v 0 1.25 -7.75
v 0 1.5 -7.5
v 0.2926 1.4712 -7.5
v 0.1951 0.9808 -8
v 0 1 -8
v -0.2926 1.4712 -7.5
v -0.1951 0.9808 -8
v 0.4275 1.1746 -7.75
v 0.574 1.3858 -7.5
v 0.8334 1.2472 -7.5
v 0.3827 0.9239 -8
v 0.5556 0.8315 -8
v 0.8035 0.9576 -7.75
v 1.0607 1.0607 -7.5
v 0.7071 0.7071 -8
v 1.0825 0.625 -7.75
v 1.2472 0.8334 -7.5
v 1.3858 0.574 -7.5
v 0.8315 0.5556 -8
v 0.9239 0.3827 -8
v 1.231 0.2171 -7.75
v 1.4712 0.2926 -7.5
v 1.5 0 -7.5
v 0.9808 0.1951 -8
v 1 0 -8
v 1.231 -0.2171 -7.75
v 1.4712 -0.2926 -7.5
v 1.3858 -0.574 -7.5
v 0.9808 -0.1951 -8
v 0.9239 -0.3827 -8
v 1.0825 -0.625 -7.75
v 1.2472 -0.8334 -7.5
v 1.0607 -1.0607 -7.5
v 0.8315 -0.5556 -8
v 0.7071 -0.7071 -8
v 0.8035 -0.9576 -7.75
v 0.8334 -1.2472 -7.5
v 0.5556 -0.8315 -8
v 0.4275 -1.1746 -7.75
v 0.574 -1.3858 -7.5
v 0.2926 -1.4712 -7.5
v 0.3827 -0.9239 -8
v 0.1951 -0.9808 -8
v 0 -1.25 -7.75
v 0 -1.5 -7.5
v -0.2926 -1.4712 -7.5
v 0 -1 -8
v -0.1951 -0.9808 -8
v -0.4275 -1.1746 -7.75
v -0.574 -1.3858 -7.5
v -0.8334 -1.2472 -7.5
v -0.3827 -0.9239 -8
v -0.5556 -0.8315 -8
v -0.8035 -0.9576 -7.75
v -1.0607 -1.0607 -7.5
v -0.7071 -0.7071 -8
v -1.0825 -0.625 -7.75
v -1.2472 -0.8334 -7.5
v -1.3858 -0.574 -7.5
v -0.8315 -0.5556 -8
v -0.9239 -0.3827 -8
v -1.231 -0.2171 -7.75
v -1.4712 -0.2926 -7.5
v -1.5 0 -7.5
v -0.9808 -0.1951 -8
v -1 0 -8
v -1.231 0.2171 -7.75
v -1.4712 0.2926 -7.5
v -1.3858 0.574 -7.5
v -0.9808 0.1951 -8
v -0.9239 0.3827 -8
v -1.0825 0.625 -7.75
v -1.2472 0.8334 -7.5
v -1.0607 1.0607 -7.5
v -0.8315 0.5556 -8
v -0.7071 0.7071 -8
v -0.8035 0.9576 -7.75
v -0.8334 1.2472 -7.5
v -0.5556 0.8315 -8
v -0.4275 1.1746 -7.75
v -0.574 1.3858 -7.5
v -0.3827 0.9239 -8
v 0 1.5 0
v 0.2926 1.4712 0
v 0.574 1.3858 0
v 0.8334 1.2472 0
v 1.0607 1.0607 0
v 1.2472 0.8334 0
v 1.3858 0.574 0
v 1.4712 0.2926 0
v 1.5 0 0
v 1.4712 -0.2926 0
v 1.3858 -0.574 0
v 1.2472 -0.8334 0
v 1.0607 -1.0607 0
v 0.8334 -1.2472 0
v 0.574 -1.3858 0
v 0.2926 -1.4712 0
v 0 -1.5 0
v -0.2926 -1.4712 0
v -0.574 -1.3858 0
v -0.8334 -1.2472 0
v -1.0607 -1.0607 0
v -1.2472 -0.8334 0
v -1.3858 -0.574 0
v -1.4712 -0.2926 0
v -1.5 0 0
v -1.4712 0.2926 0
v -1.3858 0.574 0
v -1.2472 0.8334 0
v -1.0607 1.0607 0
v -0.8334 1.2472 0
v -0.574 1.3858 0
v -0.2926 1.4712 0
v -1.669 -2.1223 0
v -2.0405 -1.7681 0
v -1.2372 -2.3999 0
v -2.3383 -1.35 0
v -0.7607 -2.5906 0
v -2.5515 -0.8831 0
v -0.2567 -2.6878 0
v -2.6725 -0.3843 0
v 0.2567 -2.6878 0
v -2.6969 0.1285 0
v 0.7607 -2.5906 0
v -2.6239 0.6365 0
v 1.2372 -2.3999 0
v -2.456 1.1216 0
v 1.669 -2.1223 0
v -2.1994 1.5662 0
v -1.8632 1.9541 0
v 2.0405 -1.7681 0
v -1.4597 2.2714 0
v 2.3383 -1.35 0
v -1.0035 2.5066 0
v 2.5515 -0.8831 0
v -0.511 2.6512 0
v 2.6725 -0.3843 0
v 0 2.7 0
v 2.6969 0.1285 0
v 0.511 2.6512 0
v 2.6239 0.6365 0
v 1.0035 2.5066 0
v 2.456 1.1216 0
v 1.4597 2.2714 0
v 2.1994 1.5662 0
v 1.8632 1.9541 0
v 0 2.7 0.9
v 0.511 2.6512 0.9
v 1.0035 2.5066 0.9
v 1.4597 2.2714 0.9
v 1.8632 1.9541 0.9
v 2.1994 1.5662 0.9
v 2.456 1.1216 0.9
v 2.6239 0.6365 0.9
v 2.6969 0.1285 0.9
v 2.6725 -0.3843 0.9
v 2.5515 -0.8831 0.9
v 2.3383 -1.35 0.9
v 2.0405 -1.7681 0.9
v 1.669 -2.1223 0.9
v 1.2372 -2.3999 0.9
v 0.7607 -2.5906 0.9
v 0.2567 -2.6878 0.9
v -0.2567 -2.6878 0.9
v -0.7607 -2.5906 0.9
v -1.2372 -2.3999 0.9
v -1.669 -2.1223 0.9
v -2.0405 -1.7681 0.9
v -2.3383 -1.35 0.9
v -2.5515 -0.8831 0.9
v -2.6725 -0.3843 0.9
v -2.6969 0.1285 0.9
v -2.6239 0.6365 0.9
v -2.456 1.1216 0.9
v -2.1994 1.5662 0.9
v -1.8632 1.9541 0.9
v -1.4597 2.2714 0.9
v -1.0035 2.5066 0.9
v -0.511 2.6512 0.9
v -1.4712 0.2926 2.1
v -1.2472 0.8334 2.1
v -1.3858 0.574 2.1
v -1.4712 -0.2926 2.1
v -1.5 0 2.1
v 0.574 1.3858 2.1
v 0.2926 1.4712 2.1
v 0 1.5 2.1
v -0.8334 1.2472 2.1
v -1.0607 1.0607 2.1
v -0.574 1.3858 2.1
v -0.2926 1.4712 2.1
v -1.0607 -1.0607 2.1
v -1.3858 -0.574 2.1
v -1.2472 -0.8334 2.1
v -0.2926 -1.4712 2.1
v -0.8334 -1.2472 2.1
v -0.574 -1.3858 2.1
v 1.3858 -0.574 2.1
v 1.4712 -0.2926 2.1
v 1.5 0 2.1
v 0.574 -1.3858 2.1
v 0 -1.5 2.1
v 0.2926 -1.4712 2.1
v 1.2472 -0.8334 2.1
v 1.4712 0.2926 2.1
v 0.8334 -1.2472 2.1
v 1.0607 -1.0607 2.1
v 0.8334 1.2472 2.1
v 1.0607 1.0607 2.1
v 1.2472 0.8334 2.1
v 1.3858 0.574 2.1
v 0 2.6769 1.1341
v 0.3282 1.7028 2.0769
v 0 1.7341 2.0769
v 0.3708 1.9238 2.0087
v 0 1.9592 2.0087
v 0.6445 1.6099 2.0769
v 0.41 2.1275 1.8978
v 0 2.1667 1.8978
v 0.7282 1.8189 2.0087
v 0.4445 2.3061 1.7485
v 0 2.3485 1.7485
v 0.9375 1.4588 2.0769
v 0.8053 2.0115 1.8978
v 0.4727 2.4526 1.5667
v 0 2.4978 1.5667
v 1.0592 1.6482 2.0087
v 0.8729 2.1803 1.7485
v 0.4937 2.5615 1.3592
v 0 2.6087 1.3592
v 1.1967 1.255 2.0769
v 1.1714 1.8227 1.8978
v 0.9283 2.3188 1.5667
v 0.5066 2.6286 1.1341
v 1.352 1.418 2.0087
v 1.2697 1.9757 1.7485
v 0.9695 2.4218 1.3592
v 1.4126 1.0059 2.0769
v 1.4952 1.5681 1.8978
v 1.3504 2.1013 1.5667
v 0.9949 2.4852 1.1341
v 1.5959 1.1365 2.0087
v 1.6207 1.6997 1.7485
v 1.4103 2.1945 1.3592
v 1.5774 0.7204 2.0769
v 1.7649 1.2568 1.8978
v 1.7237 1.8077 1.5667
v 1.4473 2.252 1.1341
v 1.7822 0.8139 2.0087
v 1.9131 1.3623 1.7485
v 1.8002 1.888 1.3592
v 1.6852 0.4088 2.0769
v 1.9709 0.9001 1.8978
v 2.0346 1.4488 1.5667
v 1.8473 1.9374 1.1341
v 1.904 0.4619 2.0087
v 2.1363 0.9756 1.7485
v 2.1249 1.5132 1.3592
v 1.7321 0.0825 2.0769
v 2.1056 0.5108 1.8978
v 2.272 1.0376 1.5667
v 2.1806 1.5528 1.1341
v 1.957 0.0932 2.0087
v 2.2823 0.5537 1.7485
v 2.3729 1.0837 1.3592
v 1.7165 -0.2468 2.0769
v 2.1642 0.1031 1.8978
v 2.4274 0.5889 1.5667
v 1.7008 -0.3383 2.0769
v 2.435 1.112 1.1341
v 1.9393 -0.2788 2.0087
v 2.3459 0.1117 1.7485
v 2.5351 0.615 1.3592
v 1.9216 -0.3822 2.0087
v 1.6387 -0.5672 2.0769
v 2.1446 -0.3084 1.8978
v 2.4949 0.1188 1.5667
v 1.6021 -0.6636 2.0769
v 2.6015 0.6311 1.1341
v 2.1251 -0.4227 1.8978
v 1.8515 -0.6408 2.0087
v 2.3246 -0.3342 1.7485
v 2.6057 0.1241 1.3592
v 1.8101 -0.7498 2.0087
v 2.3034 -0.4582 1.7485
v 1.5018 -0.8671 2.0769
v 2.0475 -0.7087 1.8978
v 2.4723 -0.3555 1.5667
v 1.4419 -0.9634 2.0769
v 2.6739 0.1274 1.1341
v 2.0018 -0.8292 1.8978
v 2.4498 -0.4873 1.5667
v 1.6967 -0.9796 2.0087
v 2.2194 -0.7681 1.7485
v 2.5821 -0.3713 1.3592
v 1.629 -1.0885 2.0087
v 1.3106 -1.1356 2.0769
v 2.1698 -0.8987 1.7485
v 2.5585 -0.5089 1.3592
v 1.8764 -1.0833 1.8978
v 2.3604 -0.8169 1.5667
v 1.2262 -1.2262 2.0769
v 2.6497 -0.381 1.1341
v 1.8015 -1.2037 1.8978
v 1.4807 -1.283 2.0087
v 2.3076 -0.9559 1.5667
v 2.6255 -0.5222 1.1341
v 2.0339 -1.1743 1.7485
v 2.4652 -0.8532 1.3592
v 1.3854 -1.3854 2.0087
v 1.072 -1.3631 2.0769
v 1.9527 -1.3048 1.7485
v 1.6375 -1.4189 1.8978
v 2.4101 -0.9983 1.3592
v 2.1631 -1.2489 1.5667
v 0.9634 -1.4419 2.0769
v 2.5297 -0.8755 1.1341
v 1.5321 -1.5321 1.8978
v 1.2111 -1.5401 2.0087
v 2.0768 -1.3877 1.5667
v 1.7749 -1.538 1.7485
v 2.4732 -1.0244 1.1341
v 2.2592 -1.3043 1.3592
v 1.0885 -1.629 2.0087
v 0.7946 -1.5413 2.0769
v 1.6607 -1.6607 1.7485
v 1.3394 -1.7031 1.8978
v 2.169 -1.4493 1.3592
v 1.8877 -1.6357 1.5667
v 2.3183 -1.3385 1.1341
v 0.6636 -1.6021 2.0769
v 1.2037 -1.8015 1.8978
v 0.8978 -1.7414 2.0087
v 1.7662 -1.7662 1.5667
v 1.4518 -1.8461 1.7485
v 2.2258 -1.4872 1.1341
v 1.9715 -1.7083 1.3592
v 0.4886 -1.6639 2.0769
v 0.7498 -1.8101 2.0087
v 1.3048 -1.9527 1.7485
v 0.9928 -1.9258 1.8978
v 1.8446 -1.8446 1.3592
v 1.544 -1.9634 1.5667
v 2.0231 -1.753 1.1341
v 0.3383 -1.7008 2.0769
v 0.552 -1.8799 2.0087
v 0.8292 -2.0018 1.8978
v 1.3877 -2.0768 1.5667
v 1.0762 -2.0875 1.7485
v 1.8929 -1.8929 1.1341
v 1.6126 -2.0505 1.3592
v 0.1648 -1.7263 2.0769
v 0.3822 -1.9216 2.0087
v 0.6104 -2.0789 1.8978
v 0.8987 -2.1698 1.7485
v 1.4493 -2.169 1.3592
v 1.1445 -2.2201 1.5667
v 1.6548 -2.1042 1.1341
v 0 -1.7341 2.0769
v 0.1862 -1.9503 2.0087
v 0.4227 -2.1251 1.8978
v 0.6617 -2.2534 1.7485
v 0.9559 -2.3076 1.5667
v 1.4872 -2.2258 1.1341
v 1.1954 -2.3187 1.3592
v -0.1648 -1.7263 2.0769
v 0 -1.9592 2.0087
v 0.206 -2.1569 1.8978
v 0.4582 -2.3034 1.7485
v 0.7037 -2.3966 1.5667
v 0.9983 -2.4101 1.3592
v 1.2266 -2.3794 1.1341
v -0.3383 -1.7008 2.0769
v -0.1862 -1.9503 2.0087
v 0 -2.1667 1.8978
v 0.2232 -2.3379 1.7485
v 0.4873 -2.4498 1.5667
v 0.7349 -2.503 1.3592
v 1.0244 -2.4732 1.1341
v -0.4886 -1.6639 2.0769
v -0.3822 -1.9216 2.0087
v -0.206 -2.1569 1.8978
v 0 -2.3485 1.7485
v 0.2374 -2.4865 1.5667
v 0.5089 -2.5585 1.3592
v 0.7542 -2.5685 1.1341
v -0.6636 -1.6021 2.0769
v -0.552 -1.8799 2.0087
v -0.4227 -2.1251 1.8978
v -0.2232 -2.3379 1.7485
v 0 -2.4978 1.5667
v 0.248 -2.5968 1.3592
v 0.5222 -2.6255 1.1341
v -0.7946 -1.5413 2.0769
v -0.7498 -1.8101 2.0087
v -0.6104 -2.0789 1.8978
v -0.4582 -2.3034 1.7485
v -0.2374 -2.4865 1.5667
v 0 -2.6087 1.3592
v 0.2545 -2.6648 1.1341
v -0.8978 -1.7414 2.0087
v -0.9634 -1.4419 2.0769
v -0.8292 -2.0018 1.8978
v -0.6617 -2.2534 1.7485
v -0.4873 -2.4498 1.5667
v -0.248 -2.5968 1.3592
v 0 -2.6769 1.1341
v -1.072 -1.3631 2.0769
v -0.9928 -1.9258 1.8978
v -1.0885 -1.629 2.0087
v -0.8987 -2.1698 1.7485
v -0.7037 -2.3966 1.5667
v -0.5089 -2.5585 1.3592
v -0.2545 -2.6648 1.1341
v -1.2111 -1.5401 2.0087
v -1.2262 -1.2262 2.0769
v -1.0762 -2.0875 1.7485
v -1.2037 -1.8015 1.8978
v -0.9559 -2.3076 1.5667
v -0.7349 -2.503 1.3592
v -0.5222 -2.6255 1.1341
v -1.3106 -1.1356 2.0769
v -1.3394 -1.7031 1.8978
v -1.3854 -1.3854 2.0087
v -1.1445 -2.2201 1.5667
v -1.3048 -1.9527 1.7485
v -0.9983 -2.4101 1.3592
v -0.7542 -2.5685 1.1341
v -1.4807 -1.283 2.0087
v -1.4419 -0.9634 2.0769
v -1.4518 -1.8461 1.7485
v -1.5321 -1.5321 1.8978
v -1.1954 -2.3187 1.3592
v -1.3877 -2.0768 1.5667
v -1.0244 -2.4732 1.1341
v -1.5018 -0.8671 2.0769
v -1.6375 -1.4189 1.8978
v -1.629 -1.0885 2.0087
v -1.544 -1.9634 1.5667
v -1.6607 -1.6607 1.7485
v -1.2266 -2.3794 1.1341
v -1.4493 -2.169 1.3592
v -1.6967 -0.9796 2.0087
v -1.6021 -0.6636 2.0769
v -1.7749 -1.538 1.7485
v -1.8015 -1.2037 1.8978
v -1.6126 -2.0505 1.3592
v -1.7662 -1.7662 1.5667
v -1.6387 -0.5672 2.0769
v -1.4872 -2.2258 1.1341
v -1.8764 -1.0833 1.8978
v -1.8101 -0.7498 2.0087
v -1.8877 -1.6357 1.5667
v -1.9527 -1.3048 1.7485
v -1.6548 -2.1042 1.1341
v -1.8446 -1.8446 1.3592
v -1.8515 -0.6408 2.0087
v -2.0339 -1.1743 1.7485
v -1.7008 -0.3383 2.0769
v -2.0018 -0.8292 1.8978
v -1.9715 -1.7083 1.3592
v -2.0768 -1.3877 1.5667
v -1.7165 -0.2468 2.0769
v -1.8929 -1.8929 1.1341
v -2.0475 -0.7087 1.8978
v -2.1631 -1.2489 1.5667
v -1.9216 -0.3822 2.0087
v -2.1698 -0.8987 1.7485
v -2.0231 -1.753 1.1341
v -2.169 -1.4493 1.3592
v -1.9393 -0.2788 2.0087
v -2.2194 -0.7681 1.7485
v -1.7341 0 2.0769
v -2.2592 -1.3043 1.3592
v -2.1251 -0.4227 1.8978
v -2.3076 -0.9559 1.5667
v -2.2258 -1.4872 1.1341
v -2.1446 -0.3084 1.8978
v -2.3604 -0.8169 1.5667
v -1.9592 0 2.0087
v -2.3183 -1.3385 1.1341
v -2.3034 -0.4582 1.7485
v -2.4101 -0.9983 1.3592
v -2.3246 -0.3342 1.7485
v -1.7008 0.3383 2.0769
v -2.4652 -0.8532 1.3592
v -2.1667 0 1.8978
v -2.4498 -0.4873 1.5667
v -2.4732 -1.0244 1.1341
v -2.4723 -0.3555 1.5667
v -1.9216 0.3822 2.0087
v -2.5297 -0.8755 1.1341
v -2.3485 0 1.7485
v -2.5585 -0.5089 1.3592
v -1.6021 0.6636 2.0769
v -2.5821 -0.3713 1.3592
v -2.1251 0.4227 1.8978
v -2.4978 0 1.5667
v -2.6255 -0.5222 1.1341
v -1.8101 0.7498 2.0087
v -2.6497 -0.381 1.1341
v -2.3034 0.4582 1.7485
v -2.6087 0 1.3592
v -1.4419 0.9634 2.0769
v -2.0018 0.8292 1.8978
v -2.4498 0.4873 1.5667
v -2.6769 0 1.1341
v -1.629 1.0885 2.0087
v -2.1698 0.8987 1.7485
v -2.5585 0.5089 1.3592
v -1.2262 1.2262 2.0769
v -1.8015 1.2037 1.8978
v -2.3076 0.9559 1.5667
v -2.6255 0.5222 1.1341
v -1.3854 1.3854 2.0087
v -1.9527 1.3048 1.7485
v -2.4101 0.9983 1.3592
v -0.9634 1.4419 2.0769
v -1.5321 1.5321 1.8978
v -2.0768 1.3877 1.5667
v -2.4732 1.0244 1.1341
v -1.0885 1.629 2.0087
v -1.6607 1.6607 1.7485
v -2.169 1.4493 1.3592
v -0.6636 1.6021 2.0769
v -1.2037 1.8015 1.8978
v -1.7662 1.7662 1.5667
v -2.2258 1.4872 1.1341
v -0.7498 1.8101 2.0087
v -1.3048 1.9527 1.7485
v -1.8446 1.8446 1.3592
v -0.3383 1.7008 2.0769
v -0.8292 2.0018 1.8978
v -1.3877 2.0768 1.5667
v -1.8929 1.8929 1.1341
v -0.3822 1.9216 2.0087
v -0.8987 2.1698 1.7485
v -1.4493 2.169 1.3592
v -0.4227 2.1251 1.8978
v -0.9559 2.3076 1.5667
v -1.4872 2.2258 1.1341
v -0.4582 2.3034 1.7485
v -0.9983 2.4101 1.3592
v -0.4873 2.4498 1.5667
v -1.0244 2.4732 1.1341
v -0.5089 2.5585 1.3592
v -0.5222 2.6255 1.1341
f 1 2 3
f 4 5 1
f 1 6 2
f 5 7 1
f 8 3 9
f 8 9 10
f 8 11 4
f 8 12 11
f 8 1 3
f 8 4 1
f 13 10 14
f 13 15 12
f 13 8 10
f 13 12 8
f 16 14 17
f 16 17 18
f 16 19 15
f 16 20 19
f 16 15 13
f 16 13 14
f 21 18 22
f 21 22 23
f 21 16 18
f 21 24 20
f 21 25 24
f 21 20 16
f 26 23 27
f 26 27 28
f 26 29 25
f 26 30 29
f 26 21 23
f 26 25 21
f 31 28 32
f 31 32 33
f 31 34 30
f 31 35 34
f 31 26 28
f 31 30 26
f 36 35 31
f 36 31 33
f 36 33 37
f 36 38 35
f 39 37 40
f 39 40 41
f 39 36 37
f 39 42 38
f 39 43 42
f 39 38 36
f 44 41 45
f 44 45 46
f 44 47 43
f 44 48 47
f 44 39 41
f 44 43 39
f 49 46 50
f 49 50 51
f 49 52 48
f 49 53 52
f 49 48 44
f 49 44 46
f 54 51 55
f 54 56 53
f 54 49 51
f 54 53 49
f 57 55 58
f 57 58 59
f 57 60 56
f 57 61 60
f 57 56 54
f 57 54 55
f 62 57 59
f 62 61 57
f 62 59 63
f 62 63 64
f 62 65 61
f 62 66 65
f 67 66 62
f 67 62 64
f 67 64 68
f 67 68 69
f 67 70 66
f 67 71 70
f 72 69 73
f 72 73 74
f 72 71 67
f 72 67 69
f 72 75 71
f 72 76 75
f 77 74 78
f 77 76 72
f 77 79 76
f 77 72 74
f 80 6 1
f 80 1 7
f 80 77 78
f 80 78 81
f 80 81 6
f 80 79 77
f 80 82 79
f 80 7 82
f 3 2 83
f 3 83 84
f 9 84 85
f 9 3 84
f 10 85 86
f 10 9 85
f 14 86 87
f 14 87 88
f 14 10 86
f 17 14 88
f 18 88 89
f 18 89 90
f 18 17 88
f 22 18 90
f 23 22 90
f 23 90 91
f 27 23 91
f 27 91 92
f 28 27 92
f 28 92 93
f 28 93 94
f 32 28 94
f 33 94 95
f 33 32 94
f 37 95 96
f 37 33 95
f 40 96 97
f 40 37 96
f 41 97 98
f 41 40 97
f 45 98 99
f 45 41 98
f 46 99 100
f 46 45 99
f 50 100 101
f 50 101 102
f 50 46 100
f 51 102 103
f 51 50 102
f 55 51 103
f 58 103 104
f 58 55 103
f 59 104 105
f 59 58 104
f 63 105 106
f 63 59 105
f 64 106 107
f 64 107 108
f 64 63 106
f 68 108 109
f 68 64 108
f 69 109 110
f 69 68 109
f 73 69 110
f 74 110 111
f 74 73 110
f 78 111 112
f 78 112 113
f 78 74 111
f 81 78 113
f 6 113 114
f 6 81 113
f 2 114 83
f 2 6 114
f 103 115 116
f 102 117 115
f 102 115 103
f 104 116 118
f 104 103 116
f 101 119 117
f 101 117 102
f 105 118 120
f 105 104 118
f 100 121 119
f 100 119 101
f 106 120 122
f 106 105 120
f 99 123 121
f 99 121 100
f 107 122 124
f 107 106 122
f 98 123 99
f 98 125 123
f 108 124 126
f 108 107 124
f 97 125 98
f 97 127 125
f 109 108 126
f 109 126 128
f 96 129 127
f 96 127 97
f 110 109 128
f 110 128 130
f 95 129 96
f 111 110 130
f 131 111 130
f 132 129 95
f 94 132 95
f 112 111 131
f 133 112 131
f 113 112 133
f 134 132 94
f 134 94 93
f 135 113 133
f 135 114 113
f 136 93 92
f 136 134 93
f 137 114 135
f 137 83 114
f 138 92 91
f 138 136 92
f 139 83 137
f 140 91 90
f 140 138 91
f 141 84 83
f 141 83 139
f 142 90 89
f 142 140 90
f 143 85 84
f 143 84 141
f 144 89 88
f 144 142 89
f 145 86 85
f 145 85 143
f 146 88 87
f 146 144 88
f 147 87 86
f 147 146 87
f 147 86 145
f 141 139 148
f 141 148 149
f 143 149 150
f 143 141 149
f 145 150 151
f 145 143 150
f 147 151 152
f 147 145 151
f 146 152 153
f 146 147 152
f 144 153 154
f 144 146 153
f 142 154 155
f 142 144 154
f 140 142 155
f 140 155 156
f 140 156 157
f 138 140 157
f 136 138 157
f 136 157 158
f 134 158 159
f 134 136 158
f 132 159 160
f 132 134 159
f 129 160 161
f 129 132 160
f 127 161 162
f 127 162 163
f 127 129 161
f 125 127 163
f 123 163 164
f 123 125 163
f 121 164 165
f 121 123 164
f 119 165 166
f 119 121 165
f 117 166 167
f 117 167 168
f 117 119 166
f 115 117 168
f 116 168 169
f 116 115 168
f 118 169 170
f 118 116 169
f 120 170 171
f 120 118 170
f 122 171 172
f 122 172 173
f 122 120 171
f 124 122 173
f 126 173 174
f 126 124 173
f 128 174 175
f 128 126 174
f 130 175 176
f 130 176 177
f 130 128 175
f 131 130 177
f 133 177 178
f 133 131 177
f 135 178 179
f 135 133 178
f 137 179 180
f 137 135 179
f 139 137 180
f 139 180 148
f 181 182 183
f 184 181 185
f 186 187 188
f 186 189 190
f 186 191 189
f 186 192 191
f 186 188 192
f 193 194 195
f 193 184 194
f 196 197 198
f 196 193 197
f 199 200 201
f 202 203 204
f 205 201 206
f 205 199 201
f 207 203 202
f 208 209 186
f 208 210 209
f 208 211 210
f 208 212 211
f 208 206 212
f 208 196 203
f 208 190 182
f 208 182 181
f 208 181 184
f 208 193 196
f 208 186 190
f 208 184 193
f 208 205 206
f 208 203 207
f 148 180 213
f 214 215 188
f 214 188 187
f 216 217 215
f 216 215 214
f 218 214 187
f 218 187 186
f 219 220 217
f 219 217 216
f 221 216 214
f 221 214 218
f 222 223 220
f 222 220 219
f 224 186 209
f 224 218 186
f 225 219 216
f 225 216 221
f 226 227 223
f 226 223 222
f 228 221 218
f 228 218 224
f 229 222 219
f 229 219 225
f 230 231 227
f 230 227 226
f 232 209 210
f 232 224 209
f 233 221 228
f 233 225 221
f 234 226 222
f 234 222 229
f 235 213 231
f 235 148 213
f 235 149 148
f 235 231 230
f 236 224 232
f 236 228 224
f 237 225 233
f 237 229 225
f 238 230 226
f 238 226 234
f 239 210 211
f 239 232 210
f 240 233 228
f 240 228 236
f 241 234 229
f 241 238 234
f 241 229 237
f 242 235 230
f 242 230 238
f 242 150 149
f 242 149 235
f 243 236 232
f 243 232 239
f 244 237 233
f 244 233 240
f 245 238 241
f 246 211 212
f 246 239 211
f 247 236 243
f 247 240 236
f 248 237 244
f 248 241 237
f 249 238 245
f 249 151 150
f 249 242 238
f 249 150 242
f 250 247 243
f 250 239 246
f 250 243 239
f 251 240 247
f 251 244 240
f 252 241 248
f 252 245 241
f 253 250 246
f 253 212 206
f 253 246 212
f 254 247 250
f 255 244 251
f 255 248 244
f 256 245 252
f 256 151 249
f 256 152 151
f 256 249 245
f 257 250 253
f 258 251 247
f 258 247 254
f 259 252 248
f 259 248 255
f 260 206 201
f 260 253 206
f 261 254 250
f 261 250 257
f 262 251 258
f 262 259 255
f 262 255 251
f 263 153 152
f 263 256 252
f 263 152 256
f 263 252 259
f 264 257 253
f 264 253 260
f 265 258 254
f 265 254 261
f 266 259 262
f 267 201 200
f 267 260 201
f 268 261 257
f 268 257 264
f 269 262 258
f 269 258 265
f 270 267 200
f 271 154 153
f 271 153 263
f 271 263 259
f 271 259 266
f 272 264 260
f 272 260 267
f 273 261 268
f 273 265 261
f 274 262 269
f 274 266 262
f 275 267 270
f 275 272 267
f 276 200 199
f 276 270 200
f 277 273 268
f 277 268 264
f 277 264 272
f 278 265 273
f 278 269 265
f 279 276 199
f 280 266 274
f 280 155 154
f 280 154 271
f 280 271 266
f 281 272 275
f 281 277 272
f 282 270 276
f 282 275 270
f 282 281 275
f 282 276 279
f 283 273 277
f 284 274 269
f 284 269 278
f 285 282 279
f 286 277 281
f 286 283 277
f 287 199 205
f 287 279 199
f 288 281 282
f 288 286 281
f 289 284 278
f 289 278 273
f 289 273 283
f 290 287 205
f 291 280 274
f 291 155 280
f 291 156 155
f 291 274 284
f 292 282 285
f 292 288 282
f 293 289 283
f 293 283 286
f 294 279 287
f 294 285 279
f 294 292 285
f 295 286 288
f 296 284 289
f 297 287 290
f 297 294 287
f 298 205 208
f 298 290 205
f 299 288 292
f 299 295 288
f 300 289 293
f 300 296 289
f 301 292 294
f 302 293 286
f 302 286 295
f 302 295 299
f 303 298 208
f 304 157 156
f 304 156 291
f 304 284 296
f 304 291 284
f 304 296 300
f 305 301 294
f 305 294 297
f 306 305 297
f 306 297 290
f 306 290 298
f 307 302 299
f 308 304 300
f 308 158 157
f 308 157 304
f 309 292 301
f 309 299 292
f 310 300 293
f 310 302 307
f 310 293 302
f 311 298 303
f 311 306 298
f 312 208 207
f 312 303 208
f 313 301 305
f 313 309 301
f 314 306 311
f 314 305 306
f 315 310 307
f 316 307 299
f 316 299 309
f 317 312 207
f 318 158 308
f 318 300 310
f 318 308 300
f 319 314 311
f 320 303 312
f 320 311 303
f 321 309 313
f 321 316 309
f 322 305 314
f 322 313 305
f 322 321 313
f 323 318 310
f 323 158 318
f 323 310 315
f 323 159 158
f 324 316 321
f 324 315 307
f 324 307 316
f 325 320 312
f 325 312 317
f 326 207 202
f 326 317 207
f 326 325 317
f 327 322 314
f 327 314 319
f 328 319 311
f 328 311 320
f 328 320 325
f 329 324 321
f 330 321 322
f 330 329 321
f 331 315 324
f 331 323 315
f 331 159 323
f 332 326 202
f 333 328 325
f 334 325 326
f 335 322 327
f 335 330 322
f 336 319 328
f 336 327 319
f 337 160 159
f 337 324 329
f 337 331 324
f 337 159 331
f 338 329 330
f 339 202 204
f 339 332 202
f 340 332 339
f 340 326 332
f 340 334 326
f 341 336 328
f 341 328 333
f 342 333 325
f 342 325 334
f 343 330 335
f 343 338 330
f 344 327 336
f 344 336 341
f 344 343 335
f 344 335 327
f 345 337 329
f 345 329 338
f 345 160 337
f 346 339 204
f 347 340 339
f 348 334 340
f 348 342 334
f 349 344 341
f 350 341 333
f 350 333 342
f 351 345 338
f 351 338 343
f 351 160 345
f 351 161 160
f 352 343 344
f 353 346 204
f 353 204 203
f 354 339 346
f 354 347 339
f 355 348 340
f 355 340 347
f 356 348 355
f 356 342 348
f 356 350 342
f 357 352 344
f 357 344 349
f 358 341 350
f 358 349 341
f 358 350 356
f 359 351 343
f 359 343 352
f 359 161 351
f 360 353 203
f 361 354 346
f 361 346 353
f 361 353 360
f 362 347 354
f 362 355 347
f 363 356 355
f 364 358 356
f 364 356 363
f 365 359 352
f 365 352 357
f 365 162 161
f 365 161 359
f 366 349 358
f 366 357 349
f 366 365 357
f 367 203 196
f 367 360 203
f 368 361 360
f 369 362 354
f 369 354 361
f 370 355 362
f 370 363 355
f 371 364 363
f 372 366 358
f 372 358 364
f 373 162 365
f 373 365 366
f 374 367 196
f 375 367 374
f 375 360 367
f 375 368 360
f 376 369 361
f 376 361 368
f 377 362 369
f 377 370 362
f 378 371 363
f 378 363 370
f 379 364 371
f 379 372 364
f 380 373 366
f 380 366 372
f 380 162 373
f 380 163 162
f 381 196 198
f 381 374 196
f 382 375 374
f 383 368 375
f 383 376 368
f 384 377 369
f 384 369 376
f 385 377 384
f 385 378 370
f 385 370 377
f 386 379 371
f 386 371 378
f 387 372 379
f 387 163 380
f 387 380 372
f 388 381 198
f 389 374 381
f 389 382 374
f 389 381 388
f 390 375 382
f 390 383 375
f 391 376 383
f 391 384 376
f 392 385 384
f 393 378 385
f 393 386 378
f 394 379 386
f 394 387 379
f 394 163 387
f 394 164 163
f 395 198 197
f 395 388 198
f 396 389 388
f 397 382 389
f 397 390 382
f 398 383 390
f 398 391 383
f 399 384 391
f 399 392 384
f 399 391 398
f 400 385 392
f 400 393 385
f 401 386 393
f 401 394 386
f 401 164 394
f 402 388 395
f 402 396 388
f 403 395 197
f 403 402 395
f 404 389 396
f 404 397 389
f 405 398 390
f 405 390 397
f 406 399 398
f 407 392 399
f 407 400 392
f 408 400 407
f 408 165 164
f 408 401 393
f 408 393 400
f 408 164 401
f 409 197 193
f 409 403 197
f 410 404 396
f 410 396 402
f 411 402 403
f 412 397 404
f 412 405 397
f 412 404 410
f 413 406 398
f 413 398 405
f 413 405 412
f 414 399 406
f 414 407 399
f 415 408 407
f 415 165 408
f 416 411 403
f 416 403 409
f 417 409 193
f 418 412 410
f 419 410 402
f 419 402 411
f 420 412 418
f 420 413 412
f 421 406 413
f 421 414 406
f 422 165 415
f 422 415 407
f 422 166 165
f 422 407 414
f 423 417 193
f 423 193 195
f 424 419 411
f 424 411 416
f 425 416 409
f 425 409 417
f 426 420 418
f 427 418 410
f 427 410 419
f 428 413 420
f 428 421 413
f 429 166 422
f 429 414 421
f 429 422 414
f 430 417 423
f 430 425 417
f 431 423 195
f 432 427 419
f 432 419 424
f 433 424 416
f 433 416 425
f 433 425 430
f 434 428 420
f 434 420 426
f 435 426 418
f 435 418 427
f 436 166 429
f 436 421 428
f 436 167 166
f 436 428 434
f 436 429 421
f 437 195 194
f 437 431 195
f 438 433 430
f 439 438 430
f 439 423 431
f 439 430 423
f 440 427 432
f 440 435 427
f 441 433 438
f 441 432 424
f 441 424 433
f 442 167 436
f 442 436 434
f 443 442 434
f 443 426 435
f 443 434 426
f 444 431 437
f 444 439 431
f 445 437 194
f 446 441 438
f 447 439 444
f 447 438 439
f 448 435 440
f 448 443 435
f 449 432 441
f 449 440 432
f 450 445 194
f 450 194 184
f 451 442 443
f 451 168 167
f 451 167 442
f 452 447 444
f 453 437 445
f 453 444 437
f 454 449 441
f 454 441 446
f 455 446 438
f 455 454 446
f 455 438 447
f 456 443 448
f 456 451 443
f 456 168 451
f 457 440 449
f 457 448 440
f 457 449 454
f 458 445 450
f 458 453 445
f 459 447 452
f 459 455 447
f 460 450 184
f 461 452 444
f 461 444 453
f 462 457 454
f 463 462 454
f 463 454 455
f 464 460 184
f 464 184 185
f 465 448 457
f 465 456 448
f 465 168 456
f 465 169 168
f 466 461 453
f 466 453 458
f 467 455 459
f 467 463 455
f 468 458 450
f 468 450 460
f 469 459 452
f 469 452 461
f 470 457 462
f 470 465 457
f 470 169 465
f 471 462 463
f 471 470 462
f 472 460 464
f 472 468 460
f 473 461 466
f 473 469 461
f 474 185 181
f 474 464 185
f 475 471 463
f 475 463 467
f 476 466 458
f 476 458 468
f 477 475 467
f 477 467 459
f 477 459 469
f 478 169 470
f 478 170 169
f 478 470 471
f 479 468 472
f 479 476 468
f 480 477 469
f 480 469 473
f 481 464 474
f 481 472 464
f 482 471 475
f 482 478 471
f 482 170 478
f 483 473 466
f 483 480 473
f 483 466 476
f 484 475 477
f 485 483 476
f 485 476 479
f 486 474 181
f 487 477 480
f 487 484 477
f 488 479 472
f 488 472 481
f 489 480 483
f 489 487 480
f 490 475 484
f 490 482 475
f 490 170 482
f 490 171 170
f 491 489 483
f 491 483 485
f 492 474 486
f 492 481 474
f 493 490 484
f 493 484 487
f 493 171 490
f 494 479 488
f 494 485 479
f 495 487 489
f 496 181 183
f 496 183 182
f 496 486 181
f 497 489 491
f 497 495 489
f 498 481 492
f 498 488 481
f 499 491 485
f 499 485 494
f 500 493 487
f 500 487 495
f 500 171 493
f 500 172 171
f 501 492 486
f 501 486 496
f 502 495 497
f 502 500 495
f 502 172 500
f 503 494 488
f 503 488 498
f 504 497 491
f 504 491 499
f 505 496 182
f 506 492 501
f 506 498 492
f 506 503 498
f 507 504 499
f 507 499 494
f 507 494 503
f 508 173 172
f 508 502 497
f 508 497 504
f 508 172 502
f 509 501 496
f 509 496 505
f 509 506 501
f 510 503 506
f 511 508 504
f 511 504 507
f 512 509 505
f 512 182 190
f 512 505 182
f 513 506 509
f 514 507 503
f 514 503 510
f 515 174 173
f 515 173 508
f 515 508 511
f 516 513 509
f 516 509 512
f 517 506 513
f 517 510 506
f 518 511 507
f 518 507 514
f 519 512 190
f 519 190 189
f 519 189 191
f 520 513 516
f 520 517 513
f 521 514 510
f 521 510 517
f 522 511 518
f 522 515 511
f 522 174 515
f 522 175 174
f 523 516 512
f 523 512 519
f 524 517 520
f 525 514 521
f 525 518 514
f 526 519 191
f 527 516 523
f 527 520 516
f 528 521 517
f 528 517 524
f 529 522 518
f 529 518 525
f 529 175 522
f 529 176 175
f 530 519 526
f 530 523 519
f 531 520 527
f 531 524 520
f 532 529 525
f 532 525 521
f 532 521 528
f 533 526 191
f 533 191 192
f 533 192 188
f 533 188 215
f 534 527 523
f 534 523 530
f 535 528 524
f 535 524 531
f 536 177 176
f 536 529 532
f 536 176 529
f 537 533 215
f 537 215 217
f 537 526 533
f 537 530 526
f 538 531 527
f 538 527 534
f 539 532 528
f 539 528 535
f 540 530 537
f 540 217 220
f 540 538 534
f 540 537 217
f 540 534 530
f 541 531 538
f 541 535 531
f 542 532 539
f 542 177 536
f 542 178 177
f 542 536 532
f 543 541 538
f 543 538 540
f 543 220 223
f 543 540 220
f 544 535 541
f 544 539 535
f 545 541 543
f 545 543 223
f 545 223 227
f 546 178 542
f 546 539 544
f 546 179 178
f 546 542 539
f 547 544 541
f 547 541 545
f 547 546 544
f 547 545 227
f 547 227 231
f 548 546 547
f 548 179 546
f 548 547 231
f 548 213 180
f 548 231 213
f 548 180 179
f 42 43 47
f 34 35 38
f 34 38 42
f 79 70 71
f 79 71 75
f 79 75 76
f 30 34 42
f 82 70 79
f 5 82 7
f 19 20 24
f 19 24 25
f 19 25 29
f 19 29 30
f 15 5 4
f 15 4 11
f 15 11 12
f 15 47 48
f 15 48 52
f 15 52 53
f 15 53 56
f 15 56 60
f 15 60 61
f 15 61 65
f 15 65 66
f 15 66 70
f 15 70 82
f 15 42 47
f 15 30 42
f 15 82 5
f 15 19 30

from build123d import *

# Parameters (mm, degrees)
VERRUNDUNG1_R = 1.2
FASE1_SIZE    = 0.5


with BuildPart() as part:
    # Skizze1 → Rotation1 (revolve)
    with BuildSketch(Plane(origin=(0, 0, 0), x_dir=(0, 0, -1), z_dir=(1, 0, 0))):
        Polygon((0, 2.7), (0, 1.5), (8, 1.5), (8, 0), (-2.1, 0), (-2.1, 2.7), align=None)
    revolve(axis=Axis((0, 0, 0), (0, 0, -1)))

    # Verrundung1
    verrundung1_edges = [part.edges().sort_by_distance(p)[0] for p in [
        (0, -2.7, 2.1),
    ]]
    fillet(verrundung1_edges, radius=VERRUNDUNG1_R)

    # Fase1
    fase1_edges = [part.edges().sort_by_distance(p)[0] for p in [
        (0, -1.5, -8),
    ]]
    chamfer(fase1_edges, length=FASE1_SIZE)


solid = part.part
